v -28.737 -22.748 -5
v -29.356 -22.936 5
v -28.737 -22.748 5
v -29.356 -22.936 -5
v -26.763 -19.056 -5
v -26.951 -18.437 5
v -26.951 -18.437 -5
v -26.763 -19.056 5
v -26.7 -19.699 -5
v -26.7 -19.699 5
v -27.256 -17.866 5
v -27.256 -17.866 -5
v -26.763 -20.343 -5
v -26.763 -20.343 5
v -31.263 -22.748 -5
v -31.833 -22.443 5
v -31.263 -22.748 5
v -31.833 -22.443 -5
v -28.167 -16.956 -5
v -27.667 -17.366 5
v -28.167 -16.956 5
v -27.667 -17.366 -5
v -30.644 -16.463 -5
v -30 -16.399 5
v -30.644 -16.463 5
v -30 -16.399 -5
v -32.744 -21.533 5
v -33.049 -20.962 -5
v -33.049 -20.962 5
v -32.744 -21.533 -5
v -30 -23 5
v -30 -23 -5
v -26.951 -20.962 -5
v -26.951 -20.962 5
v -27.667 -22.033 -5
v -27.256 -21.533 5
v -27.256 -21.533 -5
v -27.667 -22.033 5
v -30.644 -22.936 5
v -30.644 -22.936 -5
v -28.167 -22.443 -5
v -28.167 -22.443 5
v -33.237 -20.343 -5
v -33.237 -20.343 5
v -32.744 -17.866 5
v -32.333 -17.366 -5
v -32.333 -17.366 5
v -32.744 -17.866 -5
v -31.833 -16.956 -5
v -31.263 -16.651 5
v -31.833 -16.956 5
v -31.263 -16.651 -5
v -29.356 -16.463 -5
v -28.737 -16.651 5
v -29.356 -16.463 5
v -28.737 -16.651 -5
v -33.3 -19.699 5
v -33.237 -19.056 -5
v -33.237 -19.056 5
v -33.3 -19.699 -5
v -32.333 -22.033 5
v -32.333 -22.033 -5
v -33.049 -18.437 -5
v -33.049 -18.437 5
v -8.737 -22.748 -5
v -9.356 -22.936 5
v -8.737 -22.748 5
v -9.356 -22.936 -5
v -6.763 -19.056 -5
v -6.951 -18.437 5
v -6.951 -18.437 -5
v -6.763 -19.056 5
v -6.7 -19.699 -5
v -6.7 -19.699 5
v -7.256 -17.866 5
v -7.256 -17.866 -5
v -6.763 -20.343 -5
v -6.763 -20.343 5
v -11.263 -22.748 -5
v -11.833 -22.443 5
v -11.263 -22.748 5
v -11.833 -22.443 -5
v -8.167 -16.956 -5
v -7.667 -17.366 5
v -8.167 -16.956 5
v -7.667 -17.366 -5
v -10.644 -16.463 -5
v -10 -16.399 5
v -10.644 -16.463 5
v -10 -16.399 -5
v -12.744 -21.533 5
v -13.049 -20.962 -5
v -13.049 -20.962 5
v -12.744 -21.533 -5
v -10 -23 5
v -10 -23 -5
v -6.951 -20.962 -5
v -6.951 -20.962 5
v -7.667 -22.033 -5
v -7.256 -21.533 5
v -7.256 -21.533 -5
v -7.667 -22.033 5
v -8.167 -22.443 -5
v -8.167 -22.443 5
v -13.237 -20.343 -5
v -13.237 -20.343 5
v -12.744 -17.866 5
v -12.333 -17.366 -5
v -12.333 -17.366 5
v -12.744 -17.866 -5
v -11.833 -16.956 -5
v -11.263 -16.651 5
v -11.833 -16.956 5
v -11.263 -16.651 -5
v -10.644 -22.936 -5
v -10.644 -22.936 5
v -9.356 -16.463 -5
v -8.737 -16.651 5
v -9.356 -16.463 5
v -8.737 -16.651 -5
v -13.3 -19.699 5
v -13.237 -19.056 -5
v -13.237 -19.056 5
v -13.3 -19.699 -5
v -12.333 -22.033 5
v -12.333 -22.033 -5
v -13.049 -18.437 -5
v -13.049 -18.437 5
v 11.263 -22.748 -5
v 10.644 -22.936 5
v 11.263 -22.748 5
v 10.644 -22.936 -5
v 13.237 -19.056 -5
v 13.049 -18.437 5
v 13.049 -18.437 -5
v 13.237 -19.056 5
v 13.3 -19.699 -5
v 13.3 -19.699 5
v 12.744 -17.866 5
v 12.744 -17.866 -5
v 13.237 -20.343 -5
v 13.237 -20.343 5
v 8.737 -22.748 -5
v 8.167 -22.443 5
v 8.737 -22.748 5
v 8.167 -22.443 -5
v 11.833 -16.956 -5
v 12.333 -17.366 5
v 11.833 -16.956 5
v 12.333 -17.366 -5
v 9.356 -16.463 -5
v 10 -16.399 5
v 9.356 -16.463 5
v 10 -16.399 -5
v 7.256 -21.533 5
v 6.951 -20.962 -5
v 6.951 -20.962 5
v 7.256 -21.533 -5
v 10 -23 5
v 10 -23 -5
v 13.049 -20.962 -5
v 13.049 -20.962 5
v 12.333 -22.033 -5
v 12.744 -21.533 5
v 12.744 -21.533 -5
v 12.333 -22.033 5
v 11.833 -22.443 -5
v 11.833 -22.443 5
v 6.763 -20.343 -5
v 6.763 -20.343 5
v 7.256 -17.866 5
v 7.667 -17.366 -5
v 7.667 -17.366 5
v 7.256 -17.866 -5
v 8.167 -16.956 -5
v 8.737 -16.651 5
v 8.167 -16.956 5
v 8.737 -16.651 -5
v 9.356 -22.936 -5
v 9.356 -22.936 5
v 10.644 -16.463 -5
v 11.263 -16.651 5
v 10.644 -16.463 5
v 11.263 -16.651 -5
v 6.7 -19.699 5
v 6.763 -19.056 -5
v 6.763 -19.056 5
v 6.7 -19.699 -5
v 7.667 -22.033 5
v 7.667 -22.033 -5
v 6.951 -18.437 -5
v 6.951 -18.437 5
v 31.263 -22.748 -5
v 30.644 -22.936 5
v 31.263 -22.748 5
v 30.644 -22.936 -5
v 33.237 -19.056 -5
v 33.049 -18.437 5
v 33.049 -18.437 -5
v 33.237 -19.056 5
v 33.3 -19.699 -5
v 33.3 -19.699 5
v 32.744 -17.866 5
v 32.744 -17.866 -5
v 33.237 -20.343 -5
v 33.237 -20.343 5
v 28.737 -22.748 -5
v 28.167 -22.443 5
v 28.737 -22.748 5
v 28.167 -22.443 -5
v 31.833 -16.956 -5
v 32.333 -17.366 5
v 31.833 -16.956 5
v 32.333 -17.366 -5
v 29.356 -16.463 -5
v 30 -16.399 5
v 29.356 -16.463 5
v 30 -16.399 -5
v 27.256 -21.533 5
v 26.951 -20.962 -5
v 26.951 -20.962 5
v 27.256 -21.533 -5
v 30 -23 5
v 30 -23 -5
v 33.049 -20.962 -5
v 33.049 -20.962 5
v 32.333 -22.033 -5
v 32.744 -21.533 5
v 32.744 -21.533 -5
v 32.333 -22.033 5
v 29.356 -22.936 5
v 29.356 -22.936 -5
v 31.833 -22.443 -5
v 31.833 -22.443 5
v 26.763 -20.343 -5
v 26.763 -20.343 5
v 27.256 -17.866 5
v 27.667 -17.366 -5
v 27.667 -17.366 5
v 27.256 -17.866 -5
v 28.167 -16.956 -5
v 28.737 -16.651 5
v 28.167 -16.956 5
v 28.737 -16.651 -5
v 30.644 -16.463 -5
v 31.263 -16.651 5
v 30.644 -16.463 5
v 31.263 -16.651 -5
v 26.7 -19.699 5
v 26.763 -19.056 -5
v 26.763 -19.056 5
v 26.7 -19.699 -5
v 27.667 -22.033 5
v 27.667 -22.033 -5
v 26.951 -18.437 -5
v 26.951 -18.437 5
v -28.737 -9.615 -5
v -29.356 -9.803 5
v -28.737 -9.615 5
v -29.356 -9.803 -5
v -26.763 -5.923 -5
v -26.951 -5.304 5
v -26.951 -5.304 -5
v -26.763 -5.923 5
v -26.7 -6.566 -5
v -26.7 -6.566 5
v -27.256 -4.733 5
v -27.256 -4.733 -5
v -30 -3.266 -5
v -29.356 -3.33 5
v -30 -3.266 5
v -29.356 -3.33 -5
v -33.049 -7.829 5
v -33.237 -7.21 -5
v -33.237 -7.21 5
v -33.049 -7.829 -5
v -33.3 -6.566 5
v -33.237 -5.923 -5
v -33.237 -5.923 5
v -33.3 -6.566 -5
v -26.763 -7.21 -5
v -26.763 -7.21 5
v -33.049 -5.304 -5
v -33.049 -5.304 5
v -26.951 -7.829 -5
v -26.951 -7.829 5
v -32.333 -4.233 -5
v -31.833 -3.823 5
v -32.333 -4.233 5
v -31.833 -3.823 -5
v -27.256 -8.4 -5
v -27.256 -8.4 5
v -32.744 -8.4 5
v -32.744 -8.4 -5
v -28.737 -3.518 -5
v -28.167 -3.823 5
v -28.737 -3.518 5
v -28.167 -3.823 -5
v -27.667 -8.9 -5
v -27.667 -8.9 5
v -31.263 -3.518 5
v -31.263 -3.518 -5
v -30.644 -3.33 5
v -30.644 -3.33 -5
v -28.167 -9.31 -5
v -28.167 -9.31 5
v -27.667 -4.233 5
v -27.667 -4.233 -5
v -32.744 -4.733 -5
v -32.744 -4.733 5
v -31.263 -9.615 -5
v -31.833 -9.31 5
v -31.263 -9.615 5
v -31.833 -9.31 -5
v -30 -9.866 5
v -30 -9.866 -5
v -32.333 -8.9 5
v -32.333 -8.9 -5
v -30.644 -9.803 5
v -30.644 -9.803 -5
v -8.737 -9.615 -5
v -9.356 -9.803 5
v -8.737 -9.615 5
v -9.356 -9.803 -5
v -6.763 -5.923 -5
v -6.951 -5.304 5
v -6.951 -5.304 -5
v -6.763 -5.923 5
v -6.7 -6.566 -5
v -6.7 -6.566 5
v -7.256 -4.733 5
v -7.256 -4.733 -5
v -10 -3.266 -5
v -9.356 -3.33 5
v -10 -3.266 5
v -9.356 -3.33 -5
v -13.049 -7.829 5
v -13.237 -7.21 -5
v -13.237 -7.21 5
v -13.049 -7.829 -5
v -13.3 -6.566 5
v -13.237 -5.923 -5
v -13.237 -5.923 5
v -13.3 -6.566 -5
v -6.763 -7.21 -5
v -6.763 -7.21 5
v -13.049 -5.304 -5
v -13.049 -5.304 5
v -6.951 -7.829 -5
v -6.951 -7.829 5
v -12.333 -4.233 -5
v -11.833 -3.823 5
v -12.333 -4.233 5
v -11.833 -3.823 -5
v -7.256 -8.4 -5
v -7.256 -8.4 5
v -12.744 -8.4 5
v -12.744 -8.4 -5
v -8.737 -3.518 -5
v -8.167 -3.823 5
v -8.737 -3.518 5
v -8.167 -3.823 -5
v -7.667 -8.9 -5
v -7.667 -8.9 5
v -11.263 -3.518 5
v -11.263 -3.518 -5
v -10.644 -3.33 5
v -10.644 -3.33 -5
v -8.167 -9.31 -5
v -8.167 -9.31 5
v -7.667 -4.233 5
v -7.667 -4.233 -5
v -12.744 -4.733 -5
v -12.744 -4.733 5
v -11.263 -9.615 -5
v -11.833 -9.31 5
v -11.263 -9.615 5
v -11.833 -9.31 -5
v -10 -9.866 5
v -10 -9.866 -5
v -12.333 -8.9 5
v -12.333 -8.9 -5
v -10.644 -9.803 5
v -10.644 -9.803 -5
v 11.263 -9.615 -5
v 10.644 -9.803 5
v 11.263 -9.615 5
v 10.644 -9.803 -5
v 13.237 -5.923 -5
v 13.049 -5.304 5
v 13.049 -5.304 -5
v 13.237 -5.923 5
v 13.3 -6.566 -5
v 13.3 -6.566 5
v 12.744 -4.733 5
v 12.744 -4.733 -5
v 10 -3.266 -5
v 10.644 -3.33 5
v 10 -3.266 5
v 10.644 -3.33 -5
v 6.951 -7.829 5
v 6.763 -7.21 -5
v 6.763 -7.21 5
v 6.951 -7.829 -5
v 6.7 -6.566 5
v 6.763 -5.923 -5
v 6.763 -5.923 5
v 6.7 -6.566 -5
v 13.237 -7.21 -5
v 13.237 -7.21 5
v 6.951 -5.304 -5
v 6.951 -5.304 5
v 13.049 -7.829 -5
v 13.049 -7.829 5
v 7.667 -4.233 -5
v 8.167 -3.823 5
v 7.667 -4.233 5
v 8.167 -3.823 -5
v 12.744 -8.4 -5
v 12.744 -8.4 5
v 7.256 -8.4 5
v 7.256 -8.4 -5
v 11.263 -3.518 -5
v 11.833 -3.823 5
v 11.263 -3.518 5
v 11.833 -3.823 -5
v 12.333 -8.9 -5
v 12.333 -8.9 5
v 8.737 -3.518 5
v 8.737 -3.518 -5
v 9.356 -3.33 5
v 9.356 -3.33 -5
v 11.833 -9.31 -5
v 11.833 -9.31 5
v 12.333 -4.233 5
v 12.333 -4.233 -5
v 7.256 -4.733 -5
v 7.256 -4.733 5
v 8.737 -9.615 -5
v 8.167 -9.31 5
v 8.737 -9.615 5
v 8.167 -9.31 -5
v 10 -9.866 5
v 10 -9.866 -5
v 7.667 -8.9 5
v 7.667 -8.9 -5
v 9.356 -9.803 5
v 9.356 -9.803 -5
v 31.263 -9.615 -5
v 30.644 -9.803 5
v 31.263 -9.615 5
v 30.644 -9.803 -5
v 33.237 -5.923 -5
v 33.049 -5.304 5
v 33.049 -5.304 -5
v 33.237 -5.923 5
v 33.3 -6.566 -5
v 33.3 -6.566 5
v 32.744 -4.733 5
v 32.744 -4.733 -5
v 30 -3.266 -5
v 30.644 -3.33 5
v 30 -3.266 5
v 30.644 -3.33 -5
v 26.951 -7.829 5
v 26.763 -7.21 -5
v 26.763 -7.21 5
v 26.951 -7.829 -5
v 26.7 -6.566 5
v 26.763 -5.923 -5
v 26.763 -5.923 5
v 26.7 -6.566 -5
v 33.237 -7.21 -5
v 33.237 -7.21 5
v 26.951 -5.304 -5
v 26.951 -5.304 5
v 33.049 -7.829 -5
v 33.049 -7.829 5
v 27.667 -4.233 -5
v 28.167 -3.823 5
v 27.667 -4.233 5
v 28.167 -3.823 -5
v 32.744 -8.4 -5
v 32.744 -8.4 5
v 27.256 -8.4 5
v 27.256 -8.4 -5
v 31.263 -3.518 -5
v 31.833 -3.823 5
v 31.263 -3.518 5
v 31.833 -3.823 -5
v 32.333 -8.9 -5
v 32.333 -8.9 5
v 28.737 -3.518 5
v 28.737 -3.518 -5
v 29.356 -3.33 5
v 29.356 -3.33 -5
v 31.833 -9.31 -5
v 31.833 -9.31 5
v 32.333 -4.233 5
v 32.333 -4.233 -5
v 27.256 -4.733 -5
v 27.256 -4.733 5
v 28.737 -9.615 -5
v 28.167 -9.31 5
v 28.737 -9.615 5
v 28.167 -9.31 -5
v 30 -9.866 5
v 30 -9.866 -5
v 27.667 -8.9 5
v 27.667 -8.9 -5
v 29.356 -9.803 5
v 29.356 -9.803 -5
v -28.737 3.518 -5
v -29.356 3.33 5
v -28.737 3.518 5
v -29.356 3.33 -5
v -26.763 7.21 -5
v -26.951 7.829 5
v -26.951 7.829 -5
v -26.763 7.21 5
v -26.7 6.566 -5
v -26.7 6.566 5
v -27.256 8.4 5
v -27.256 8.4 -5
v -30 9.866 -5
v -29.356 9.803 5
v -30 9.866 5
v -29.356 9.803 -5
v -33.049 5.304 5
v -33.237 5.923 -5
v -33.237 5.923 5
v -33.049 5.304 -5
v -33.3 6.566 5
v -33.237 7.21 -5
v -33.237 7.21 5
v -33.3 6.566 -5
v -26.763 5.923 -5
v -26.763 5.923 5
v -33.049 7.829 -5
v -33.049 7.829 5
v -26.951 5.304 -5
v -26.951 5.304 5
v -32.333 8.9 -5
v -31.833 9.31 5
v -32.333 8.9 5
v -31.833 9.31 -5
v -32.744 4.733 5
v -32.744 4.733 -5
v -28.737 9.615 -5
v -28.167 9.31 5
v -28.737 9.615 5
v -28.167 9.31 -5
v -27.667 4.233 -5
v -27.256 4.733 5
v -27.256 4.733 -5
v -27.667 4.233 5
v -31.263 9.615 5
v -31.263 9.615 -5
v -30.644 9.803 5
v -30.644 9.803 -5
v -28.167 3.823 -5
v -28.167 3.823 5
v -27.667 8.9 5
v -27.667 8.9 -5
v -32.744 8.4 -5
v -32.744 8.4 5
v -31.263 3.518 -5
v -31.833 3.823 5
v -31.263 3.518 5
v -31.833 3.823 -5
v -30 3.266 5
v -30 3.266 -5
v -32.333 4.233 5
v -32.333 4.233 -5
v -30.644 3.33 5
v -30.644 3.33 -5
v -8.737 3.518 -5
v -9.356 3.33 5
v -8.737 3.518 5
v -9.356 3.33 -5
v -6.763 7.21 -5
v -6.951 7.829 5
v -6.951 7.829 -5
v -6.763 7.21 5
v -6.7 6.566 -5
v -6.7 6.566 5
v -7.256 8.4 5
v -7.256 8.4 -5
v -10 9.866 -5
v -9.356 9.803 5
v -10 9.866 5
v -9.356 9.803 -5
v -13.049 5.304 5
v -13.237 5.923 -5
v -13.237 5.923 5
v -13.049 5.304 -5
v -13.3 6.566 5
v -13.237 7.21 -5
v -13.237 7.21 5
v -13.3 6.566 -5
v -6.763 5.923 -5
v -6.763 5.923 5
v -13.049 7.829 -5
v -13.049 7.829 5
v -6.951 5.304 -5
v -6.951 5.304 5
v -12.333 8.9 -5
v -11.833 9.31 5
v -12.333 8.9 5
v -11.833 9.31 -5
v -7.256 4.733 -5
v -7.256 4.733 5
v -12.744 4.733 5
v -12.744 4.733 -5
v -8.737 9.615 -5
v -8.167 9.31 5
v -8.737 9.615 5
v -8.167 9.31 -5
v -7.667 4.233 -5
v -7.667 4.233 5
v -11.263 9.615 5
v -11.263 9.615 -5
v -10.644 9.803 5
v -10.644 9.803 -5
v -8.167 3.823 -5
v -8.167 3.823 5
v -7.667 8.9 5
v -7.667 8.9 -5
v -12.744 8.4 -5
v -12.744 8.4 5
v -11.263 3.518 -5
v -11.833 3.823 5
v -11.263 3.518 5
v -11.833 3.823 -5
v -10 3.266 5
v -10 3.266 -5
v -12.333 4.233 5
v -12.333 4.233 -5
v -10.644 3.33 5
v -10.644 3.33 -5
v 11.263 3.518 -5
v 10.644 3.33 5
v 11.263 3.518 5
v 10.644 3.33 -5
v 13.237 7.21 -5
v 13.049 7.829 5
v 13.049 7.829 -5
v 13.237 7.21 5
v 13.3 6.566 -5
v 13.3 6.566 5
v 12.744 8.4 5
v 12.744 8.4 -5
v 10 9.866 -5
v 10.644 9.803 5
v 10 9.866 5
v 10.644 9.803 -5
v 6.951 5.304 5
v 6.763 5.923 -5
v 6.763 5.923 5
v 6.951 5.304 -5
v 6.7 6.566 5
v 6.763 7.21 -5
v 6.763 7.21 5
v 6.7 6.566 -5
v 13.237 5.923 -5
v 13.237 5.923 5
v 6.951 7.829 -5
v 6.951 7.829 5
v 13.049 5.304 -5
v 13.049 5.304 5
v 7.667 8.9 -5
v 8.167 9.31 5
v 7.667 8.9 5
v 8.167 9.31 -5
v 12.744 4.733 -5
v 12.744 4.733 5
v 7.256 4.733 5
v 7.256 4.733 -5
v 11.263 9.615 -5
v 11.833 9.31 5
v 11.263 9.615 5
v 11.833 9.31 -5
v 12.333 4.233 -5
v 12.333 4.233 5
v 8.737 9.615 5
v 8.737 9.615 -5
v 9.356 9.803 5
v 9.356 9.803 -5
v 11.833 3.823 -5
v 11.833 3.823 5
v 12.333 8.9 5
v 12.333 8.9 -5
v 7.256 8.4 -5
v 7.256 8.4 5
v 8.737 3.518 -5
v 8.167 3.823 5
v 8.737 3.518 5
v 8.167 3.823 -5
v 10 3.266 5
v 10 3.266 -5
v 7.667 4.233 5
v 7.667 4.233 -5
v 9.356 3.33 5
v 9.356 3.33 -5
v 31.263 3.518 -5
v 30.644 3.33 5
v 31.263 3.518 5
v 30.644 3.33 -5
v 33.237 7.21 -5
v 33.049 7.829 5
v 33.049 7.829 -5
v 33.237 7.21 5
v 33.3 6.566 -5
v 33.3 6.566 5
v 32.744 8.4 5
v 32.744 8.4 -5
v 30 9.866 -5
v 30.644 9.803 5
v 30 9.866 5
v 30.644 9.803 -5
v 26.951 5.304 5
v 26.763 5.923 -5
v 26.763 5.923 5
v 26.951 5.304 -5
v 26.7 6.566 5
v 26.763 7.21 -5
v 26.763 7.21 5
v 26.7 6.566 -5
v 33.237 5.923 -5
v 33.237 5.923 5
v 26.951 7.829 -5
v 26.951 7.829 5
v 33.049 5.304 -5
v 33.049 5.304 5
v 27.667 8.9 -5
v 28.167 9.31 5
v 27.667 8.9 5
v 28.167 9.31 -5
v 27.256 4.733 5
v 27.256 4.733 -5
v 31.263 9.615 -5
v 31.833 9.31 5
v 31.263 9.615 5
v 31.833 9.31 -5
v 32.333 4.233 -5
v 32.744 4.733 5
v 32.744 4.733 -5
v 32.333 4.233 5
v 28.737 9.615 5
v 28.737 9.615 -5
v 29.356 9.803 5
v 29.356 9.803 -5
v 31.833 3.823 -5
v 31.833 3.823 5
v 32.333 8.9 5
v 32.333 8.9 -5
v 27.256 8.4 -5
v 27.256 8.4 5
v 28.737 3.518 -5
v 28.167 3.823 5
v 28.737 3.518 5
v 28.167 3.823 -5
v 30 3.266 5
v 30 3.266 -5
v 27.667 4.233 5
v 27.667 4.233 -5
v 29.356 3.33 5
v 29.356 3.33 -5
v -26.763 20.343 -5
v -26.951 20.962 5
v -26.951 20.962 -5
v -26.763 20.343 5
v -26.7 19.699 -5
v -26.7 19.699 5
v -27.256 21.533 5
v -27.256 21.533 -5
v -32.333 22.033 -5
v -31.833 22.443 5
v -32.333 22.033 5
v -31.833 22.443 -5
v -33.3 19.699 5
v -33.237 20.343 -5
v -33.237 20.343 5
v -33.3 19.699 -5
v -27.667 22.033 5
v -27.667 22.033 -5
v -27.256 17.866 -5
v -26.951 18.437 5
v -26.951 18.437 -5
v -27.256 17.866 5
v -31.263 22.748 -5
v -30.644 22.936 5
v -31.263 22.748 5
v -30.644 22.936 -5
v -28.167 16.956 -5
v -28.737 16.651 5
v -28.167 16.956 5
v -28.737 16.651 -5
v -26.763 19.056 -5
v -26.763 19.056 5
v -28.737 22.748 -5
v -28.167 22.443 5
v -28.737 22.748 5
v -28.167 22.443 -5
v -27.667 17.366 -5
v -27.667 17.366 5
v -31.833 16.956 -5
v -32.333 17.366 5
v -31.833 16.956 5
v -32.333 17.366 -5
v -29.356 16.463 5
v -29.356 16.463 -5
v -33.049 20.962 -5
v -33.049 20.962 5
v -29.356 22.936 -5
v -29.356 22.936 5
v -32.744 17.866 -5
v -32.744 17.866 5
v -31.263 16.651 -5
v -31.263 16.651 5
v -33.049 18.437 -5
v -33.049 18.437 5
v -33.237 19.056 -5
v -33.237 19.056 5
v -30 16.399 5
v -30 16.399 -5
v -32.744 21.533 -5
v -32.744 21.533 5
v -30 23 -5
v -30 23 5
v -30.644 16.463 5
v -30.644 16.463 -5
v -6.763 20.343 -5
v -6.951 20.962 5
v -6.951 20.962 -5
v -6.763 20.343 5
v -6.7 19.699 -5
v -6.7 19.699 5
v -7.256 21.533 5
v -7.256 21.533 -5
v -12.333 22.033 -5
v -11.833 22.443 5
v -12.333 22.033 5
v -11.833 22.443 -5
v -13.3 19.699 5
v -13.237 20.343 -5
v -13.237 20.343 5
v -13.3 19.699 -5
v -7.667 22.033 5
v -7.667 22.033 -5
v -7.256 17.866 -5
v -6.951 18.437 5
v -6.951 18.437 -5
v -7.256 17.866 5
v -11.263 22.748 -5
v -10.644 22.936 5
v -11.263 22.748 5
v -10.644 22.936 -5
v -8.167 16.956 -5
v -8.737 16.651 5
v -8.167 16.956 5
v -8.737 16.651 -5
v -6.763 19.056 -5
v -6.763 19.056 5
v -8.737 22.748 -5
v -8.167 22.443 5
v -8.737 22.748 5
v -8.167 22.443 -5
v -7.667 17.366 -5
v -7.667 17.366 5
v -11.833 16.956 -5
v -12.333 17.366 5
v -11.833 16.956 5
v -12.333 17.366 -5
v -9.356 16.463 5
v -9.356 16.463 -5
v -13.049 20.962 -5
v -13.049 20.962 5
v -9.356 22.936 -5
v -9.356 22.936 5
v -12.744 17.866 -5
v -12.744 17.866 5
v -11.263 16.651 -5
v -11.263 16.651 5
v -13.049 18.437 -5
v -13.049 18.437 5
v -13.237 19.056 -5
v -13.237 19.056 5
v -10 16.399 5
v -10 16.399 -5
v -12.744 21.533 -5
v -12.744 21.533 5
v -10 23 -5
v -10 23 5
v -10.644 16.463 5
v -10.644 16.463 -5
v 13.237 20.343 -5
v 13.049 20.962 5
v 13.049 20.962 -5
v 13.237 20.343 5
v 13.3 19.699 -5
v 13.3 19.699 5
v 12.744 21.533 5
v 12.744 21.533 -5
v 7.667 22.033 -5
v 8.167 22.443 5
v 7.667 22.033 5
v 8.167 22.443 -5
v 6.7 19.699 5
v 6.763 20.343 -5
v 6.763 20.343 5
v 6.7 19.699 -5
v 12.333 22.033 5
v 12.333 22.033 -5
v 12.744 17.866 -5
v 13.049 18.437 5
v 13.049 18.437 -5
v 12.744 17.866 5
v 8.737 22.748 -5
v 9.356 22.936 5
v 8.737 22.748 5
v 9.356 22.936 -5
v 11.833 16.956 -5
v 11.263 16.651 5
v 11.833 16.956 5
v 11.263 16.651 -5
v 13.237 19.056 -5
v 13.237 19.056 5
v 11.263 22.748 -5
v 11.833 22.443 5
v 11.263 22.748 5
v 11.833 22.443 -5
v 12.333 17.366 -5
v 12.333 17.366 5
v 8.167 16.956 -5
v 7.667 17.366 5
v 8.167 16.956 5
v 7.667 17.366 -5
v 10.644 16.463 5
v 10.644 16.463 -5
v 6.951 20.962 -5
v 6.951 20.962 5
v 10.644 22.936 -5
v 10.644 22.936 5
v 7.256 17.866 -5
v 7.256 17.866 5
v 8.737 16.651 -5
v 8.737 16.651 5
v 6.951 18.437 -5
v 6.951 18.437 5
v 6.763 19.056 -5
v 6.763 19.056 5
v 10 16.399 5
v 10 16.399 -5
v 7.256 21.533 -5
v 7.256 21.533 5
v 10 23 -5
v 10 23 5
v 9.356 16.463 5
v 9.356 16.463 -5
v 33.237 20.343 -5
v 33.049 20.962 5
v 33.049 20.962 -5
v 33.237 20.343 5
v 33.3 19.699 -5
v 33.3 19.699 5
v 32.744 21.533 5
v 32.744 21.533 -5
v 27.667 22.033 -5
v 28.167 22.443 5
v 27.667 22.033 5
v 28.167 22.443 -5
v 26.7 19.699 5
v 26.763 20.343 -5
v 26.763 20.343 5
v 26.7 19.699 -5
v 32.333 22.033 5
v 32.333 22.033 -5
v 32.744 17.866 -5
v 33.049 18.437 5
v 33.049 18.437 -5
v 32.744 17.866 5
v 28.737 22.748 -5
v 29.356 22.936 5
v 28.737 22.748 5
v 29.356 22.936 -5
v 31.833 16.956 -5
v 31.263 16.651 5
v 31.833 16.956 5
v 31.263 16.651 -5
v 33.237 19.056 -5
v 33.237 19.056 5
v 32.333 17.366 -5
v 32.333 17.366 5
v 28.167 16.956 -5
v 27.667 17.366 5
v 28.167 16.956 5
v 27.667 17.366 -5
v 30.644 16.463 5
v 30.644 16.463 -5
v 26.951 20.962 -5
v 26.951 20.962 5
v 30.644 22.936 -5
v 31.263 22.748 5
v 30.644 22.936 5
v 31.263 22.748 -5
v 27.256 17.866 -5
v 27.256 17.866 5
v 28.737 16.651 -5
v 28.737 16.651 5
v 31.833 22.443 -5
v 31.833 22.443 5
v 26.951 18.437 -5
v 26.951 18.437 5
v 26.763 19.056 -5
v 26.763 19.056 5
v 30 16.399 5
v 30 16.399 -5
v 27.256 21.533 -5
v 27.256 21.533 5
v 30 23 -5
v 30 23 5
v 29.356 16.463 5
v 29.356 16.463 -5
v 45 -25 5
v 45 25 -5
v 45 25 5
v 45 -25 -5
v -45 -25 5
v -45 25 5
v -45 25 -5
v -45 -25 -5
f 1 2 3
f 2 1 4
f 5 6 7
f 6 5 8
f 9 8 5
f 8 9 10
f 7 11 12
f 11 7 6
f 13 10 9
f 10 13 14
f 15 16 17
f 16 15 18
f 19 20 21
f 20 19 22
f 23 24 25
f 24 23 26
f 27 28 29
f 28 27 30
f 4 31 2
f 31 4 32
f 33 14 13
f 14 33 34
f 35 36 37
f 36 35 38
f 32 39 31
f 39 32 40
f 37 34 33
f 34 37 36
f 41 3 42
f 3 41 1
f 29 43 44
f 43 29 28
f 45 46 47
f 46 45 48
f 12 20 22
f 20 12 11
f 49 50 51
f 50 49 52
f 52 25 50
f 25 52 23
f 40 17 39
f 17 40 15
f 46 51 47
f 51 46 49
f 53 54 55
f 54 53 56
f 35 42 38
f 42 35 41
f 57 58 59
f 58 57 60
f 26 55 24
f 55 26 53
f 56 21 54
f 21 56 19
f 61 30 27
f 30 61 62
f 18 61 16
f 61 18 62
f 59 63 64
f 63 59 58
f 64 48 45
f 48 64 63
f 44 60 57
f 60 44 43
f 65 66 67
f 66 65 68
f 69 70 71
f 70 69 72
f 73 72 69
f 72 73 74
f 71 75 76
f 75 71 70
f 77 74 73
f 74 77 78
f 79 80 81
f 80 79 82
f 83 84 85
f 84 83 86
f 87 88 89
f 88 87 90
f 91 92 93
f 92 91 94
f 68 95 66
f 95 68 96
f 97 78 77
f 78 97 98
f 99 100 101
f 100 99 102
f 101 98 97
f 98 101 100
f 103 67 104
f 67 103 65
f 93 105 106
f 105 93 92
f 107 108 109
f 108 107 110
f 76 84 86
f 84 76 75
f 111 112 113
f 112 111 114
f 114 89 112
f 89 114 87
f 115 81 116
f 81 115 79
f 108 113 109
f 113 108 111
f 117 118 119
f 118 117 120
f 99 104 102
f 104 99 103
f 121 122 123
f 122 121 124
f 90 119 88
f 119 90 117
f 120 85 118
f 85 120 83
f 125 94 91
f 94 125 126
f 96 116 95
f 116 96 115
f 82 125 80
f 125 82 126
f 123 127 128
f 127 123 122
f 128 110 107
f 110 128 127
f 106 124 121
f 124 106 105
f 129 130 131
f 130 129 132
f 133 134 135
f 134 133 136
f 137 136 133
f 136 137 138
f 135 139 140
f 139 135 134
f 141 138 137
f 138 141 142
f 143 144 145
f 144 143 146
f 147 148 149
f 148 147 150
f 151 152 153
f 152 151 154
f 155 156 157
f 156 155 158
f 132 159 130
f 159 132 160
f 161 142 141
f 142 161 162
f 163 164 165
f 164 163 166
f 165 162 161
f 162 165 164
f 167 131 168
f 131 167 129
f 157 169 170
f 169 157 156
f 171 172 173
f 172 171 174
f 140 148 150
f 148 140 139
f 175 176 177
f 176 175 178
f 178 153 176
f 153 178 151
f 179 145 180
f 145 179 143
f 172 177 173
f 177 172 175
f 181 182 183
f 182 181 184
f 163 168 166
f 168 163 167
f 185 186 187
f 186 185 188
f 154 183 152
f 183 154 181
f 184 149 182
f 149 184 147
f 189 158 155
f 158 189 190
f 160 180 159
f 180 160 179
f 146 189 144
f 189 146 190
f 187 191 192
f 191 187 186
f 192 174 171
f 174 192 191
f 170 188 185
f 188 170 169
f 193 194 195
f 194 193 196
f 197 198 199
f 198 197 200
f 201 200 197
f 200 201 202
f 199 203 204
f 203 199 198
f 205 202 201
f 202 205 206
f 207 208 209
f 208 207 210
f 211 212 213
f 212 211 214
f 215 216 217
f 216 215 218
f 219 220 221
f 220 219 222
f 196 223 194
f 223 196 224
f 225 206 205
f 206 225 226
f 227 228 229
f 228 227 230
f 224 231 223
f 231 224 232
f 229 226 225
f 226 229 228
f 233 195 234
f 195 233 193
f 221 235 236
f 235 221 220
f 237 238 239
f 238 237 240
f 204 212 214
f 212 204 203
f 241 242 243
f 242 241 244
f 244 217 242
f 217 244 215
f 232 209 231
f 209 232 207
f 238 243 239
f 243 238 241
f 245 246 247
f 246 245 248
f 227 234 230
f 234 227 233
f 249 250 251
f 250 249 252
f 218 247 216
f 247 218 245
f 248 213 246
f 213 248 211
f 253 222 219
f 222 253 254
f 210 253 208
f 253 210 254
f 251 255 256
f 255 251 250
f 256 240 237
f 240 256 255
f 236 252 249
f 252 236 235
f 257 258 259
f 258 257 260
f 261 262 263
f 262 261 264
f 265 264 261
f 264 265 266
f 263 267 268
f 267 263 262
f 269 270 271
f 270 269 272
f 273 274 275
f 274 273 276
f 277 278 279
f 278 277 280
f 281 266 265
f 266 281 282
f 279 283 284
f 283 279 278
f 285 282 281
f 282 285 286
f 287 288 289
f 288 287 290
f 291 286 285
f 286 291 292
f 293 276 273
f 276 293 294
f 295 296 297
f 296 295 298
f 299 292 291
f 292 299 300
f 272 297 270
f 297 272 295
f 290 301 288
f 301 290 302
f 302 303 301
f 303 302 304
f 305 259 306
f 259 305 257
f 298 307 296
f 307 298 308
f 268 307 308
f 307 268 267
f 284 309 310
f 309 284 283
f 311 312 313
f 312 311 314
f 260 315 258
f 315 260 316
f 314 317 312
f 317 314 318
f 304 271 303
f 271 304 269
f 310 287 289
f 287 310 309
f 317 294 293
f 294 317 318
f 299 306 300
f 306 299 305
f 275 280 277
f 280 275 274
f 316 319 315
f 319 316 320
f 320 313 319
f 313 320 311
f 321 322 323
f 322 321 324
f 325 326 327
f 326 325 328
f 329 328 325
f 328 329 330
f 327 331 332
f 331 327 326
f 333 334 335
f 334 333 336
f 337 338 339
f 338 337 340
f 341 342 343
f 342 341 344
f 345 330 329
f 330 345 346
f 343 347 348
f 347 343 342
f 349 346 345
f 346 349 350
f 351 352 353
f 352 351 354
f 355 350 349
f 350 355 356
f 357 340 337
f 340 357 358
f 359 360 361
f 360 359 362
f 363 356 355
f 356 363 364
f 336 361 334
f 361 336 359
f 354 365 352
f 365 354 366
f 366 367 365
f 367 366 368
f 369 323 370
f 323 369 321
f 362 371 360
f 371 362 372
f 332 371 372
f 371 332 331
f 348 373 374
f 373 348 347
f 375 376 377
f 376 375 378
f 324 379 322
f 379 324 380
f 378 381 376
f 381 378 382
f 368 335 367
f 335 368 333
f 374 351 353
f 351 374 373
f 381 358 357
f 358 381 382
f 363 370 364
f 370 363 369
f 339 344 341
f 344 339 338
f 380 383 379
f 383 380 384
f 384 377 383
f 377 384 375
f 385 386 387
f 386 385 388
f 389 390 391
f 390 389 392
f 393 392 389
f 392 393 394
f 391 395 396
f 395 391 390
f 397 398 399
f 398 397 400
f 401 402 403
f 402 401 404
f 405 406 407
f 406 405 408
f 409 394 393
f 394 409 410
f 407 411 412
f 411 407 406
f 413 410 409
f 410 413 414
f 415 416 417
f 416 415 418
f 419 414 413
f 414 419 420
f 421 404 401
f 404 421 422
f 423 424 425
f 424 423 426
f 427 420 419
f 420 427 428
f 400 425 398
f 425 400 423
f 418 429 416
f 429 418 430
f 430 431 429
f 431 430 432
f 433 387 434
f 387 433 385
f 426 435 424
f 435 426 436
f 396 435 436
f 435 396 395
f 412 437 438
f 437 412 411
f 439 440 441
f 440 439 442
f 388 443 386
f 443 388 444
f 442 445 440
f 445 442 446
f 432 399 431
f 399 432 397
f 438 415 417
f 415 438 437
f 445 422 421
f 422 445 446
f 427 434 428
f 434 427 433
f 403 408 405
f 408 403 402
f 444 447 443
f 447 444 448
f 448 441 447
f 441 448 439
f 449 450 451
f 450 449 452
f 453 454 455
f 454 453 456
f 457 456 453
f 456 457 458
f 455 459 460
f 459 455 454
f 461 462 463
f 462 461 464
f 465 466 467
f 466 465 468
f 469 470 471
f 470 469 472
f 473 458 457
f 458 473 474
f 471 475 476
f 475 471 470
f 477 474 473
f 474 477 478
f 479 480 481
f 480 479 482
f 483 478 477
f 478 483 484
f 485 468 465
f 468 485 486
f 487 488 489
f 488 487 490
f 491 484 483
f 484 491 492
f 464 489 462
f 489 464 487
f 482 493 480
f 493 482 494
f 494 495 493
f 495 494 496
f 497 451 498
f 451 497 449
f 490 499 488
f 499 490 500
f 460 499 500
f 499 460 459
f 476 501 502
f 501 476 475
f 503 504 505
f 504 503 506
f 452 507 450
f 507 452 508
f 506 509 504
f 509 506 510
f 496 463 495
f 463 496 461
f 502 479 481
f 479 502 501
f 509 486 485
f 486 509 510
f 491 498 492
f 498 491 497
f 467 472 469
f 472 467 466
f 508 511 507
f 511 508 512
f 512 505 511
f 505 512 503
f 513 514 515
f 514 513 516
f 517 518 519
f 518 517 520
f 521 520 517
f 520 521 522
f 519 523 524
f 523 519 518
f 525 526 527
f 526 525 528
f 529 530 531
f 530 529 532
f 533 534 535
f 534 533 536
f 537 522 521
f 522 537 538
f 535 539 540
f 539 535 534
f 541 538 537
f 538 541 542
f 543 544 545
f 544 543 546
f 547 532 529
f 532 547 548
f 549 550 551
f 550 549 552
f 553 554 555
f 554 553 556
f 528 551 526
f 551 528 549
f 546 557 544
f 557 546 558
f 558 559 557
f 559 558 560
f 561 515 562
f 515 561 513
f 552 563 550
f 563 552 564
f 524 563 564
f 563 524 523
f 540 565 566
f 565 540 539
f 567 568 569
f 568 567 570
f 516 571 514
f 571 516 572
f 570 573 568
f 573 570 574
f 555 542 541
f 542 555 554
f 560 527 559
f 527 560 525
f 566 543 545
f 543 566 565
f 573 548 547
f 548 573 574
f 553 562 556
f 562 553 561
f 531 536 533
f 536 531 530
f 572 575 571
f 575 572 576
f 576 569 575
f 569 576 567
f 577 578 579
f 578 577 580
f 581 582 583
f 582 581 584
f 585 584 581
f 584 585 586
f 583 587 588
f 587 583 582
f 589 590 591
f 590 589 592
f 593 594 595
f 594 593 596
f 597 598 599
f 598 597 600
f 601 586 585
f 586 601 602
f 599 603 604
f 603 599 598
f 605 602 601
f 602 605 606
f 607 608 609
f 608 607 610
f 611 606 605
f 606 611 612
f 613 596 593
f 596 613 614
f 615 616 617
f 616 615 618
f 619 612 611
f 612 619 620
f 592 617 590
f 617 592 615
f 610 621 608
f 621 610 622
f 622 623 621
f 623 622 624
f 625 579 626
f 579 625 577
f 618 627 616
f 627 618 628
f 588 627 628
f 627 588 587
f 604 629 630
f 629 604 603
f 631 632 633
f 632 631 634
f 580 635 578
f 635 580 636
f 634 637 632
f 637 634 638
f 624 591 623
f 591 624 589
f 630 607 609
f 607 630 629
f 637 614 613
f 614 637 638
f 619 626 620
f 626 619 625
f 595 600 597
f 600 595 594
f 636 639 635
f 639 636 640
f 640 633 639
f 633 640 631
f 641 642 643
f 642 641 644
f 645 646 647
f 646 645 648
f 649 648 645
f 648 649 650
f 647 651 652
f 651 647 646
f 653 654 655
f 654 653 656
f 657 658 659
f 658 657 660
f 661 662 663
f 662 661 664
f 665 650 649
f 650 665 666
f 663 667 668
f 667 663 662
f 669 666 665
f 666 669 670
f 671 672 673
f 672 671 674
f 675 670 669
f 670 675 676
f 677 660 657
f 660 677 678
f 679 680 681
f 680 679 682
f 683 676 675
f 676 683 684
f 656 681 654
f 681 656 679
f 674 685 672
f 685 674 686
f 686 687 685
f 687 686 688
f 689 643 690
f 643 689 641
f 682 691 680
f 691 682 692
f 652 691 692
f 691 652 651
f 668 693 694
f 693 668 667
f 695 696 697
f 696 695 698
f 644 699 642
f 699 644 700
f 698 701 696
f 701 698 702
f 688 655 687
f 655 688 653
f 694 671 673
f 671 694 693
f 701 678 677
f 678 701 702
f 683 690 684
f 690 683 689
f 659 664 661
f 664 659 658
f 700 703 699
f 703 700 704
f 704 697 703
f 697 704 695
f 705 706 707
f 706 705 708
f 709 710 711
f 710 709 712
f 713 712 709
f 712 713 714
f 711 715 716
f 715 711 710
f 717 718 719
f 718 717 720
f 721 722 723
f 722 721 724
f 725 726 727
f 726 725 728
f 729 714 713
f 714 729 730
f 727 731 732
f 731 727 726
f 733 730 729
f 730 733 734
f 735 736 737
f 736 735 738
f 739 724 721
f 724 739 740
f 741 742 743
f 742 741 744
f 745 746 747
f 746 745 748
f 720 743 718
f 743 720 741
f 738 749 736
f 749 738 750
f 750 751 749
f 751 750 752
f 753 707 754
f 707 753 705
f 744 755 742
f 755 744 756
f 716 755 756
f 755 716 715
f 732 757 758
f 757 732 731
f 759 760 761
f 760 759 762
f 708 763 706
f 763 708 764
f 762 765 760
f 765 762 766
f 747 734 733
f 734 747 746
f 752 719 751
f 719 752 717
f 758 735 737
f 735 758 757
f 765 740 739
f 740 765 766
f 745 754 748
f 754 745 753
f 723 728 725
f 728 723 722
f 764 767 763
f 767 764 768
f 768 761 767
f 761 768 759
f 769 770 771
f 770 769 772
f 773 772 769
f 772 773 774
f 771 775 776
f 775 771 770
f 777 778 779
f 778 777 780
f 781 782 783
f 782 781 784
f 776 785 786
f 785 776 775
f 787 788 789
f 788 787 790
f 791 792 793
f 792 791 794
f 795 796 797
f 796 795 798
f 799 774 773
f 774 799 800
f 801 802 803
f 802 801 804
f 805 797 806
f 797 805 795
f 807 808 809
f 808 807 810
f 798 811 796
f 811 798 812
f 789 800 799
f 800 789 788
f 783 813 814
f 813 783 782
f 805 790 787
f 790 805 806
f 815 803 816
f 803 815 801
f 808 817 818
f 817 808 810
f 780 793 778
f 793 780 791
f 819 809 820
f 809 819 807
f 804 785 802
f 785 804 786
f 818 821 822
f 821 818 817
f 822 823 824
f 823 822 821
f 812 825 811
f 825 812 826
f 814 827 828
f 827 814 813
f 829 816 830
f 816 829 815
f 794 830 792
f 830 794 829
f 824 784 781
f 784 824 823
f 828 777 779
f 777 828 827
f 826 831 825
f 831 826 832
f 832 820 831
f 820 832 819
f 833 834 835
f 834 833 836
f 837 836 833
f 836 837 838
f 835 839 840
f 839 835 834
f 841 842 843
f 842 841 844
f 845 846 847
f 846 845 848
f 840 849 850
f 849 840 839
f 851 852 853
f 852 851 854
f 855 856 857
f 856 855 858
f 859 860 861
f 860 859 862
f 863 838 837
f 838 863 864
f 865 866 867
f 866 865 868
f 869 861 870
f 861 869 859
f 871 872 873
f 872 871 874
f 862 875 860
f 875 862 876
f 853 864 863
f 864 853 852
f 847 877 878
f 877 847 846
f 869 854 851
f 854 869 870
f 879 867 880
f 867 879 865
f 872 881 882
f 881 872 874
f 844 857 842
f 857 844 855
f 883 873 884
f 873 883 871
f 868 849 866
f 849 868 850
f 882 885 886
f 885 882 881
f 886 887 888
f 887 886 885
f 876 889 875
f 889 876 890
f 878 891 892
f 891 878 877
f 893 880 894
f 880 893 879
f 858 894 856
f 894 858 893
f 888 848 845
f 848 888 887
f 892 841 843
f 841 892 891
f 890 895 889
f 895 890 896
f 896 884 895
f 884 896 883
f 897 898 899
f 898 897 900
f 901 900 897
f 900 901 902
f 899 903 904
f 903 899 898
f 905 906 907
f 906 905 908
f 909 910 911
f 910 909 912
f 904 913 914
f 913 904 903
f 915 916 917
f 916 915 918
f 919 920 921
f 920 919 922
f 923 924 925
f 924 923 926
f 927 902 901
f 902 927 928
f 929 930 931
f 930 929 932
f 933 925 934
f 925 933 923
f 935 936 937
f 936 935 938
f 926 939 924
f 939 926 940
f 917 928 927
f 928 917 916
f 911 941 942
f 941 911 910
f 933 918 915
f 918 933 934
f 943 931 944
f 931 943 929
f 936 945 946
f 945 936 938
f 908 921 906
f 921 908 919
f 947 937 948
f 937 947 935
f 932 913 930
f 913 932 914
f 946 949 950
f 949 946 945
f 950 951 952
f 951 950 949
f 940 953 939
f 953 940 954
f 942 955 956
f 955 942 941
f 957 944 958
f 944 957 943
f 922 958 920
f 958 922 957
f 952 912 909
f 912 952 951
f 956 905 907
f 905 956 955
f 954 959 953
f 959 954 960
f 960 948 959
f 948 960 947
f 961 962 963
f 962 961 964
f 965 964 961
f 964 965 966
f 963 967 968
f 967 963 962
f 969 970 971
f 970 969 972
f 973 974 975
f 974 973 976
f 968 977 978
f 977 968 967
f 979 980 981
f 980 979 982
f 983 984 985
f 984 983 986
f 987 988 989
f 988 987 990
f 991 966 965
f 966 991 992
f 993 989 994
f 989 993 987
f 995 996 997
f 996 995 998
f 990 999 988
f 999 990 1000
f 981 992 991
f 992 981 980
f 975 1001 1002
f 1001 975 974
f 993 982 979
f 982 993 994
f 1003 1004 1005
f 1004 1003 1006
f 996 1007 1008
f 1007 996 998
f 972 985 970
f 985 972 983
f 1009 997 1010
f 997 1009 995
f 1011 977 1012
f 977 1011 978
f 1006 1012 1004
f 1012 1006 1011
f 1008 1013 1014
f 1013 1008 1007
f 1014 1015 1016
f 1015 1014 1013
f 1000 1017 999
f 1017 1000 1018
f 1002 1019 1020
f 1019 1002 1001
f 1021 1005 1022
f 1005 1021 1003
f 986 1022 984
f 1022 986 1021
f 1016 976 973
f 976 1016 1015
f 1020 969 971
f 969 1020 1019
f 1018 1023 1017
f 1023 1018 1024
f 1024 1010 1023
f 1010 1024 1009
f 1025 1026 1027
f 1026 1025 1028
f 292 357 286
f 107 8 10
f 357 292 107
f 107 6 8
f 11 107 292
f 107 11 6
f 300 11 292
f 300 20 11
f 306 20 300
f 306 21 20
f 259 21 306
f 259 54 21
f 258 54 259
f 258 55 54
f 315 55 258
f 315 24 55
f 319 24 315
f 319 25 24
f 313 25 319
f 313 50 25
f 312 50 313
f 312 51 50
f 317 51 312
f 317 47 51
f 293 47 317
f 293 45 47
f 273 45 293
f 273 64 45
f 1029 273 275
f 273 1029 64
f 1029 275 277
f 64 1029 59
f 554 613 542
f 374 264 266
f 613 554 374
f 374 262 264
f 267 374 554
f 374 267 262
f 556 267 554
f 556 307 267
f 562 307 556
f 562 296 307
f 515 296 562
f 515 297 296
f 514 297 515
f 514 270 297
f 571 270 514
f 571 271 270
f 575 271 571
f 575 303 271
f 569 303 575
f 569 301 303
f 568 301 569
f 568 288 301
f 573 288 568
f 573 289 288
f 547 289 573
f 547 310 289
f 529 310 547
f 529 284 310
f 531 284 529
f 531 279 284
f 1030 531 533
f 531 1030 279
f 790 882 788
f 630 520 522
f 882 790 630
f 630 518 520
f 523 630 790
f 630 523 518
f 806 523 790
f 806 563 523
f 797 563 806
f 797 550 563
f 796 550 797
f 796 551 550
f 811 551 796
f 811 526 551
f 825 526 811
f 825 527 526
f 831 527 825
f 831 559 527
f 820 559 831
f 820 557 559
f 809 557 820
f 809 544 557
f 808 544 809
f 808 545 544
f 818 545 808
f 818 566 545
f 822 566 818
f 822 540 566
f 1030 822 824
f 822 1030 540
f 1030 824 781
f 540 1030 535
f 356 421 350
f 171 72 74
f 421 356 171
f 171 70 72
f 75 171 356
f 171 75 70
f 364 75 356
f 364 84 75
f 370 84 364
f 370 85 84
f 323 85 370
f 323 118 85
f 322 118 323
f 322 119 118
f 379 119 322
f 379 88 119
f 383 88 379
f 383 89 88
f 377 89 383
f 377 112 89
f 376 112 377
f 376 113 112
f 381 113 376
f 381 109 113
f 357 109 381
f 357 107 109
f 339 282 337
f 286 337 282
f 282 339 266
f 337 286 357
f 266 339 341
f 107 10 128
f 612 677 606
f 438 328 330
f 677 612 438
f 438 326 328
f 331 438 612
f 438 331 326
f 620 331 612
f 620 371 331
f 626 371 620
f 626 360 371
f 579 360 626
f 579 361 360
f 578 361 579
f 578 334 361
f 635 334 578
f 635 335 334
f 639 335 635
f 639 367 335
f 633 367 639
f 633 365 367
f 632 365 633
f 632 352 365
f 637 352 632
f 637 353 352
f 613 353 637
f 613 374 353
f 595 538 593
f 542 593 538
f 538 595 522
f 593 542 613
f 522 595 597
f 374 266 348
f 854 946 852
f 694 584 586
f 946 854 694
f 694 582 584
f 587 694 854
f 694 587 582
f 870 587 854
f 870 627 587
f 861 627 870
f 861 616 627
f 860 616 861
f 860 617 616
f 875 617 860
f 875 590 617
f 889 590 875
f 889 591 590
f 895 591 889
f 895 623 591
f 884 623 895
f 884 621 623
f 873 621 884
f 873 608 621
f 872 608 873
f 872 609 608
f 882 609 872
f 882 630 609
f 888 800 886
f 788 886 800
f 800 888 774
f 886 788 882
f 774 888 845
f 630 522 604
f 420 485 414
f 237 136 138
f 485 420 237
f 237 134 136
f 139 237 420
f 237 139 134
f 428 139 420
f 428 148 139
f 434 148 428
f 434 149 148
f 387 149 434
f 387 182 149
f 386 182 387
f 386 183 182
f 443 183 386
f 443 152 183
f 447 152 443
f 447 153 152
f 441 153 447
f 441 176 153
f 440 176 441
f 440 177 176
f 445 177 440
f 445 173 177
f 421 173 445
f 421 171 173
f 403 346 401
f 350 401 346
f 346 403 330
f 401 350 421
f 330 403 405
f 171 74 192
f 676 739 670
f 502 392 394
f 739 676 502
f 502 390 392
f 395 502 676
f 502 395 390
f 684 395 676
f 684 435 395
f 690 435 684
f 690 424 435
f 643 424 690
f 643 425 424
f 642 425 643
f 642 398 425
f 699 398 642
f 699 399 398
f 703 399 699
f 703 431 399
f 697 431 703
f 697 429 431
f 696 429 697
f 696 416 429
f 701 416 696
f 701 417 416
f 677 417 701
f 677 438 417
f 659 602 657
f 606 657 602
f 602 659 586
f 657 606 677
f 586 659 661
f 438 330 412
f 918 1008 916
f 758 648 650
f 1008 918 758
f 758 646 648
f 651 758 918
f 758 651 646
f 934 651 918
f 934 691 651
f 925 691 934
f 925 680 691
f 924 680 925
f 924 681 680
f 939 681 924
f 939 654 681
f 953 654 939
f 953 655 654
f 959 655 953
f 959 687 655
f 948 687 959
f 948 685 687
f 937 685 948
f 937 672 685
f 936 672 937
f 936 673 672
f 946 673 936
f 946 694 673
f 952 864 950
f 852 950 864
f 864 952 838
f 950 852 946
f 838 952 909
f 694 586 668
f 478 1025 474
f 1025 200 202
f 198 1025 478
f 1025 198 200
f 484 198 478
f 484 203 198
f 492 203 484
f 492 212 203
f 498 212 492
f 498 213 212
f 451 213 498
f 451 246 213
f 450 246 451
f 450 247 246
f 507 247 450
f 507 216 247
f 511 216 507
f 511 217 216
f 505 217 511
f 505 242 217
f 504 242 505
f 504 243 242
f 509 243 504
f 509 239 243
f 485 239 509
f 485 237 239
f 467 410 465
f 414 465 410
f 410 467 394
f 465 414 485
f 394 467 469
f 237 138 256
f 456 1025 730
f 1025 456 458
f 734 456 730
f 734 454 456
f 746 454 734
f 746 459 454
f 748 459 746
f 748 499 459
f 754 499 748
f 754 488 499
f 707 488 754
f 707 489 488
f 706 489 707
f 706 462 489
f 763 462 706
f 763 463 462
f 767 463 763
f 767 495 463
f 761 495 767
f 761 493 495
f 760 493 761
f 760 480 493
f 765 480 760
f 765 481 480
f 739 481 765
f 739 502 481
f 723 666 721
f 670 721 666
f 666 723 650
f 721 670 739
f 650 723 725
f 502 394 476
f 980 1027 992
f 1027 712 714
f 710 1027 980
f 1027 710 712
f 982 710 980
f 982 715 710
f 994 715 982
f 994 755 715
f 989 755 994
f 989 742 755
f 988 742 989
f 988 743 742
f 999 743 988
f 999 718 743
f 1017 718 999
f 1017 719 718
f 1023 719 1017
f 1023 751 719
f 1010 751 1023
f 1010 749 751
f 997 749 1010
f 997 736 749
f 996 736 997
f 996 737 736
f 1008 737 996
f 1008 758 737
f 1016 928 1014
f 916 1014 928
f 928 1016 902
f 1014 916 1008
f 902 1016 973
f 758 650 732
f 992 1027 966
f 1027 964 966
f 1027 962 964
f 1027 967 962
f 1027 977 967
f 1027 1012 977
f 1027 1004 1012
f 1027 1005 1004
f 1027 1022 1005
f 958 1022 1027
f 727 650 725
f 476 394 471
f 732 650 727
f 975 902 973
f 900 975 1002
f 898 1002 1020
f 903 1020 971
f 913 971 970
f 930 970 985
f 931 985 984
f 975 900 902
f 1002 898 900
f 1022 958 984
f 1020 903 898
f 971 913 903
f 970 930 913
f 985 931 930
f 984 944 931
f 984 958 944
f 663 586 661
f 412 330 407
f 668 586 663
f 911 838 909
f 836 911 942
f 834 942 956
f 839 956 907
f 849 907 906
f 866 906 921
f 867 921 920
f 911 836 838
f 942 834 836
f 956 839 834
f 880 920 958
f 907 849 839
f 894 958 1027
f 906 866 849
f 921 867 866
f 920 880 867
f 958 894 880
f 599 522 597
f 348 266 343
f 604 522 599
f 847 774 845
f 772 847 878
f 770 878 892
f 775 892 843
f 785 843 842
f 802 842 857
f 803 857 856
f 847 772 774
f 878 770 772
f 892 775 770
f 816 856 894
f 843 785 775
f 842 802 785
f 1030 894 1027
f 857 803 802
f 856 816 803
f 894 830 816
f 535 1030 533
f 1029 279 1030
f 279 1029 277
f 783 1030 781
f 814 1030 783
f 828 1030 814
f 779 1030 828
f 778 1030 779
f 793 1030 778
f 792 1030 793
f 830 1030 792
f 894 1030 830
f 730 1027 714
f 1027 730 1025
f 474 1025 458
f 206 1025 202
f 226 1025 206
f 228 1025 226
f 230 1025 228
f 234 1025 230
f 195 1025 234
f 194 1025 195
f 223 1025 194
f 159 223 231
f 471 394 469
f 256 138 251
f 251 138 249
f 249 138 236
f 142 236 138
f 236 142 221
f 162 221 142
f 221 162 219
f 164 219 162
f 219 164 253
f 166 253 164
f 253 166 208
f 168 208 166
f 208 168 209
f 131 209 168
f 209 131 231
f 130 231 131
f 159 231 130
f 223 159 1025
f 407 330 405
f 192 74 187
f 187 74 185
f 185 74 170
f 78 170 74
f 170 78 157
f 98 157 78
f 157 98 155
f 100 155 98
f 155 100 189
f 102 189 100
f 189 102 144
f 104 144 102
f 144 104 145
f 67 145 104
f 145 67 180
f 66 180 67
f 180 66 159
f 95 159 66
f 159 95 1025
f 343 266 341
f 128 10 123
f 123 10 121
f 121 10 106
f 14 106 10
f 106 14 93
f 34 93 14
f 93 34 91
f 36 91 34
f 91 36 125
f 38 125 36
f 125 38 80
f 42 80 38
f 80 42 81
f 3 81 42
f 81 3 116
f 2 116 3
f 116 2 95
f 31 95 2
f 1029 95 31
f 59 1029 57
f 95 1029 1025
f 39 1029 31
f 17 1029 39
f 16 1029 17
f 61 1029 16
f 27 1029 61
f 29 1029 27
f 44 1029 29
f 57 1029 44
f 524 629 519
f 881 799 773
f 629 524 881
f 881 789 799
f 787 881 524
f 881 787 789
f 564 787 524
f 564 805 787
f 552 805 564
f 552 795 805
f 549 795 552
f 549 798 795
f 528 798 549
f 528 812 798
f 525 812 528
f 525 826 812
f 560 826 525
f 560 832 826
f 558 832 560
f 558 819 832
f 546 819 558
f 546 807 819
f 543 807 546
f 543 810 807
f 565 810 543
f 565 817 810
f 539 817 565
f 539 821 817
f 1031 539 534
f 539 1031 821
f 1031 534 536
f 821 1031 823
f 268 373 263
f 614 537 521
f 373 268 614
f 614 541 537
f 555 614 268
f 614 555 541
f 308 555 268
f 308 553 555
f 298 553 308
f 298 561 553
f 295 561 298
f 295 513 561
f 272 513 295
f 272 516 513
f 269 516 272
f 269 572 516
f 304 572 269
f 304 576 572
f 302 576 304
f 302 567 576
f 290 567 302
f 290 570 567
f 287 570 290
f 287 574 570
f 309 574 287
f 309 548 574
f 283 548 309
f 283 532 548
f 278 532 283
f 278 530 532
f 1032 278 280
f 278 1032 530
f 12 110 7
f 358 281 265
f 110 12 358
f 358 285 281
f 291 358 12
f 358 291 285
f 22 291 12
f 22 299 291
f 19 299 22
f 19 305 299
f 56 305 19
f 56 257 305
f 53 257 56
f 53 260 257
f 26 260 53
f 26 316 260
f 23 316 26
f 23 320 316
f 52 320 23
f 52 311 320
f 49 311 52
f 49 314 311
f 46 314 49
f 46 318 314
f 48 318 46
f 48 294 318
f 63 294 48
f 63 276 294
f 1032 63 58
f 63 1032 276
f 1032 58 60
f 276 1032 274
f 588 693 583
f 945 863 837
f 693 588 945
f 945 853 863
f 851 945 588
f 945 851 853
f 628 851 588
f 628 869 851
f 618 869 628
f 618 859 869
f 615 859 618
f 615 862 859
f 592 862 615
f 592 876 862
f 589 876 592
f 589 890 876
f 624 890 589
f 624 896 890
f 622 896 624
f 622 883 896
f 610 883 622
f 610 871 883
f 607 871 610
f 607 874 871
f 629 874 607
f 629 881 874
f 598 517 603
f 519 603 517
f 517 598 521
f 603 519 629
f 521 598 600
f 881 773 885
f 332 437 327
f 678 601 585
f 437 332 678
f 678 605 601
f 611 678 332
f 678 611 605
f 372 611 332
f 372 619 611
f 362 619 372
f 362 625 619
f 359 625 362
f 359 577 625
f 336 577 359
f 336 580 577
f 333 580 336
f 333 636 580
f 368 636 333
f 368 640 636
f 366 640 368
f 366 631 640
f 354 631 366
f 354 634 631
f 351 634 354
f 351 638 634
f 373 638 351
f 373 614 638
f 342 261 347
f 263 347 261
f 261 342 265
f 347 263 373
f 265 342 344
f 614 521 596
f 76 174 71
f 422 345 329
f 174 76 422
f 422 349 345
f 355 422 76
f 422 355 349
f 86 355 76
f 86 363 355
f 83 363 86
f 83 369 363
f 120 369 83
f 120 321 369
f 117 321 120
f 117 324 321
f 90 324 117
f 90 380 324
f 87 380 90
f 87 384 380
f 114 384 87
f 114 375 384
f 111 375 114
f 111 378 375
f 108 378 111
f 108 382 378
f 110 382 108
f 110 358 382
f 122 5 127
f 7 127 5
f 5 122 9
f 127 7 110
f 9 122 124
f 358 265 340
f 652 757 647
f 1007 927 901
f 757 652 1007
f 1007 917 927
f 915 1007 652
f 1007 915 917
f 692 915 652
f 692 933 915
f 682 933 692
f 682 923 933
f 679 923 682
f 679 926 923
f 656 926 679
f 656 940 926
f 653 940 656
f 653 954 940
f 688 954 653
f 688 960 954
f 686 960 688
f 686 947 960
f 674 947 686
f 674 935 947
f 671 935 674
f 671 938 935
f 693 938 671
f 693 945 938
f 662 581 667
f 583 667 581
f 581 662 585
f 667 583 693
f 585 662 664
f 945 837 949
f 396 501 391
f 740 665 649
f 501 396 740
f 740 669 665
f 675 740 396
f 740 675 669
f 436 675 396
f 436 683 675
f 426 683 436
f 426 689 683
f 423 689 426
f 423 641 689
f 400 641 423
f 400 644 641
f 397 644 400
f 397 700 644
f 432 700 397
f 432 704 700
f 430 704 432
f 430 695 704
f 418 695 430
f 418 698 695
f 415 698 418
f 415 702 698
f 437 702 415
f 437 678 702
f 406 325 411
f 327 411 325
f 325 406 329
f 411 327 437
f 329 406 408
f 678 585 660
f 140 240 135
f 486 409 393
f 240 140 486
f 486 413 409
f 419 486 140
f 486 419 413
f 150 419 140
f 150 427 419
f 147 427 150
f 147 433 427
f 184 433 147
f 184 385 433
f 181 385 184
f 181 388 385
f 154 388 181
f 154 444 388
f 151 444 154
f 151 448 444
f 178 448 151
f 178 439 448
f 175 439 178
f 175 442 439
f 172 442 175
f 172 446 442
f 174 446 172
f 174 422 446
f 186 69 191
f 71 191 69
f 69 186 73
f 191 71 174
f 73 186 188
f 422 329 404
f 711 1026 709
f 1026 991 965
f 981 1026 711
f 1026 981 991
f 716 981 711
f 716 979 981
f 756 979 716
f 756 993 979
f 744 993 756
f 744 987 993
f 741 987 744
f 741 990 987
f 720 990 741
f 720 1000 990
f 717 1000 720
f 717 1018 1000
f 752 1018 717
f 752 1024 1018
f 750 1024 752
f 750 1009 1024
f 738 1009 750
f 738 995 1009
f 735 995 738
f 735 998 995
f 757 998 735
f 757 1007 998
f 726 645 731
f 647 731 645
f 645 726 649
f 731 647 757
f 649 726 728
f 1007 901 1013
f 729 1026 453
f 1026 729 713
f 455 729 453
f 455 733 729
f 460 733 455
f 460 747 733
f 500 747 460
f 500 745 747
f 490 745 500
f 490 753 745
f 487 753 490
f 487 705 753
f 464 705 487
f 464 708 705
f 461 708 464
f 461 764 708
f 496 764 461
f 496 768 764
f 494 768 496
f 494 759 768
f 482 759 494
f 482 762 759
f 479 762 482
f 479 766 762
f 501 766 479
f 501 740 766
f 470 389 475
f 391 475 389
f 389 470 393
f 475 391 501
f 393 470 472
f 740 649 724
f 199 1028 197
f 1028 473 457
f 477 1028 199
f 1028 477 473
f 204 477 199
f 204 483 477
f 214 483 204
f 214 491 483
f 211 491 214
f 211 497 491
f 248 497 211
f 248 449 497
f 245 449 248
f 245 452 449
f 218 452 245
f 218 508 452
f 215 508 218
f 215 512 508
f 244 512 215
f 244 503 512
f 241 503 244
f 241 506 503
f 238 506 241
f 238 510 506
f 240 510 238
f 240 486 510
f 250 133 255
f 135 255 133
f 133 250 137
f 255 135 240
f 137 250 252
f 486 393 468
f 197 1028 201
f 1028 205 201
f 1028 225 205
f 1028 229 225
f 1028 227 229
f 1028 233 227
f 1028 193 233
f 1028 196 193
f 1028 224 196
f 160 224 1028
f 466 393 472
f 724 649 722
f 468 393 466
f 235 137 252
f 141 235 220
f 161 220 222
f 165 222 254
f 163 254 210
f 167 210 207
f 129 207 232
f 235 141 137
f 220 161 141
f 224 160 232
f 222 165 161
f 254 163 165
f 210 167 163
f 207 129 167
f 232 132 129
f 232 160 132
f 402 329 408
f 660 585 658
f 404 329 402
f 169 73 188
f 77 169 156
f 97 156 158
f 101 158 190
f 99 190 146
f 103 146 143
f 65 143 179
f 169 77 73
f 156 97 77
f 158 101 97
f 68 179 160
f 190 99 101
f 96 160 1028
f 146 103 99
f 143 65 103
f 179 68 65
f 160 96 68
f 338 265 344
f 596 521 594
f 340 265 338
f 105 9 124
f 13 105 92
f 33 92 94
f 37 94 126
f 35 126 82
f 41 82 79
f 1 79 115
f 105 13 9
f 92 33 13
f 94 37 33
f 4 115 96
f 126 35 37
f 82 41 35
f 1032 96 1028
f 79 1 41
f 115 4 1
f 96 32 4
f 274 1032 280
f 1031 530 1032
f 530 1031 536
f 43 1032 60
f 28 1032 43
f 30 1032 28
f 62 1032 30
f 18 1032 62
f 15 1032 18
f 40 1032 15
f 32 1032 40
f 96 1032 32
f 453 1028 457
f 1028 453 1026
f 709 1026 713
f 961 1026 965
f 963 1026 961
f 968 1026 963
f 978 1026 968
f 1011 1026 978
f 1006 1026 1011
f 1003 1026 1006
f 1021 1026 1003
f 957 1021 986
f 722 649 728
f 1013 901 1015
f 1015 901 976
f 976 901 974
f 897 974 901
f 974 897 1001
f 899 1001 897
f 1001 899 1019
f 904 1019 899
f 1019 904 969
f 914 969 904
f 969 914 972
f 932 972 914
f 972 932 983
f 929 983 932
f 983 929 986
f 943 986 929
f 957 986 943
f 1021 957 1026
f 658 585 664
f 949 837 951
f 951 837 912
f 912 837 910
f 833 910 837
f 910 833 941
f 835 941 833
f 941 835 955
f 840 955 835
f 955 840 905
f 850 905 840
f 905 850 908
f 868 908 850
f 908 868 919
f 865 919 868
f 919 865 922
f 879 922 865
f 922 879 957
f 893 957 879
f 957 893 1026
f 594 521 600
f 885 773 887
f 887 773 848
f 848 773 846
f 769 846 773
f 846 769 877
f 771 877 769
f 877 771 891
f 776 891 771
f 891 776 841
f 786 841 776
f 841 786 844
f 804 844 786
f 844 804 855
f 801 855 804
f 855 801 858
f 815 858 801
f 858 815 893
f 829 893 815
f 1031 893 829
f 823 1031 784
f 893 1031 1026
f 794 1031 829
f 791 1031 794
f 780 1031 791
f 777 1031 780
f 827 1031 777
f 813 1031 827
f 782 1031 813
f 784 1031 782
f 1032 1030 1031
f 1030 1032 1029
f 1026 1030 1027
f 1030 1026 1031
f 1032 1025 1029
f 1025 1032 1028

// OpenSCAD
$fn = 32;

// ----------------------------------------------------------------------
// Perforated panel 90 x 50 x 10
// 4 x 4 Ø6.6 holes, grid layout
// ----------------------------------------------------------------------

// --- parameters (mm) ---
panel = [90, 50, 10];  // overall size (x, y, z)
hole_d = 6.6;          // hole diameter
pitch_x = 20;          // hole pitch along X
pitch_y = 13.133;      // hole pitch along Y

// --- derived feature positions (mm) ---
margin = hole_d / 2 + 2;            // = 5.3   clearance from the panel edge
cols = floor((panel[0] - 2 * margin) / pitch_x) + 1;  // = 4   how many columns fit in X
rows = floor((panel[1] - 2 * margin) / pitch_y) + 1;  // = 4   how many rows fit in Y
span_x = (cols - 1) * pitch_x + 0;  // = 60   width of the field
span_y = (rows - 1) * pitch_y;      // = 39.4   height of the field
origin_x = -span_x / 2;             // = -30   X of the first hole
origin_y = -span_y / 2;             // = -19.7   Y of the first row
holes = rows * cols;                // = 16   holes in total
feature_centers = [
  [origin_x + 0 * pitch_x, origin_y + 0 * pitch_y],
  [origin_x + 1 * pitch_x, origin_y + 0 * pitch_y],
  [origin_x + 2 * pitch_x, origin_y + 0 * pitch_y],
  [origin_x + 3 * pitch_x, origin_y + 0 * pitch_y],
  [origin_x + 0 * pitch_x, origin_y + 1 * pitch_y],
  [origin_x + 1 * pitch_x, origin_y + 1 * pitch_y],
  [origin_x + 2 * pitch_x, origin_y + 1 * pitch_y],
  [origin_x + 3 * pitch_x, origin_y + 1 * pitch_y],
  [origin_x + 0 * pitch_x, origin_y + 2 * pitch_y],
  [origin_x + 1 * pitch_x, origin_y + 2 * pitch_y],
  [origin_x + 2 * pitch_x, origin_y + 2 * pitch_y],
  [origin_x + 3 * pitch_x, origin_y + 2 * pitch_y],
  [origin_x + 0 * pitch_x, origin_y + 3 * pitch_y],
  [origin_x + 1 * pitch_x, origin_y + 3 * pitch_y],
  [origin_x + 2 * pitch_x, origin_y + 3 * pitch_y],
  [origin_x + 3 * pitch_x, origin_y + 3 * pitch_y]
];   // hole centres, used verbatim by the cutter loop

// panel outline, every hole through
difference() {
  cube(panel, center = true);
  for (centre = feature_centers)
    translate([centre[0], centre[1], 0])
      cylinder(d = hole_d, h = panel[2] + 2, center = true);
}
